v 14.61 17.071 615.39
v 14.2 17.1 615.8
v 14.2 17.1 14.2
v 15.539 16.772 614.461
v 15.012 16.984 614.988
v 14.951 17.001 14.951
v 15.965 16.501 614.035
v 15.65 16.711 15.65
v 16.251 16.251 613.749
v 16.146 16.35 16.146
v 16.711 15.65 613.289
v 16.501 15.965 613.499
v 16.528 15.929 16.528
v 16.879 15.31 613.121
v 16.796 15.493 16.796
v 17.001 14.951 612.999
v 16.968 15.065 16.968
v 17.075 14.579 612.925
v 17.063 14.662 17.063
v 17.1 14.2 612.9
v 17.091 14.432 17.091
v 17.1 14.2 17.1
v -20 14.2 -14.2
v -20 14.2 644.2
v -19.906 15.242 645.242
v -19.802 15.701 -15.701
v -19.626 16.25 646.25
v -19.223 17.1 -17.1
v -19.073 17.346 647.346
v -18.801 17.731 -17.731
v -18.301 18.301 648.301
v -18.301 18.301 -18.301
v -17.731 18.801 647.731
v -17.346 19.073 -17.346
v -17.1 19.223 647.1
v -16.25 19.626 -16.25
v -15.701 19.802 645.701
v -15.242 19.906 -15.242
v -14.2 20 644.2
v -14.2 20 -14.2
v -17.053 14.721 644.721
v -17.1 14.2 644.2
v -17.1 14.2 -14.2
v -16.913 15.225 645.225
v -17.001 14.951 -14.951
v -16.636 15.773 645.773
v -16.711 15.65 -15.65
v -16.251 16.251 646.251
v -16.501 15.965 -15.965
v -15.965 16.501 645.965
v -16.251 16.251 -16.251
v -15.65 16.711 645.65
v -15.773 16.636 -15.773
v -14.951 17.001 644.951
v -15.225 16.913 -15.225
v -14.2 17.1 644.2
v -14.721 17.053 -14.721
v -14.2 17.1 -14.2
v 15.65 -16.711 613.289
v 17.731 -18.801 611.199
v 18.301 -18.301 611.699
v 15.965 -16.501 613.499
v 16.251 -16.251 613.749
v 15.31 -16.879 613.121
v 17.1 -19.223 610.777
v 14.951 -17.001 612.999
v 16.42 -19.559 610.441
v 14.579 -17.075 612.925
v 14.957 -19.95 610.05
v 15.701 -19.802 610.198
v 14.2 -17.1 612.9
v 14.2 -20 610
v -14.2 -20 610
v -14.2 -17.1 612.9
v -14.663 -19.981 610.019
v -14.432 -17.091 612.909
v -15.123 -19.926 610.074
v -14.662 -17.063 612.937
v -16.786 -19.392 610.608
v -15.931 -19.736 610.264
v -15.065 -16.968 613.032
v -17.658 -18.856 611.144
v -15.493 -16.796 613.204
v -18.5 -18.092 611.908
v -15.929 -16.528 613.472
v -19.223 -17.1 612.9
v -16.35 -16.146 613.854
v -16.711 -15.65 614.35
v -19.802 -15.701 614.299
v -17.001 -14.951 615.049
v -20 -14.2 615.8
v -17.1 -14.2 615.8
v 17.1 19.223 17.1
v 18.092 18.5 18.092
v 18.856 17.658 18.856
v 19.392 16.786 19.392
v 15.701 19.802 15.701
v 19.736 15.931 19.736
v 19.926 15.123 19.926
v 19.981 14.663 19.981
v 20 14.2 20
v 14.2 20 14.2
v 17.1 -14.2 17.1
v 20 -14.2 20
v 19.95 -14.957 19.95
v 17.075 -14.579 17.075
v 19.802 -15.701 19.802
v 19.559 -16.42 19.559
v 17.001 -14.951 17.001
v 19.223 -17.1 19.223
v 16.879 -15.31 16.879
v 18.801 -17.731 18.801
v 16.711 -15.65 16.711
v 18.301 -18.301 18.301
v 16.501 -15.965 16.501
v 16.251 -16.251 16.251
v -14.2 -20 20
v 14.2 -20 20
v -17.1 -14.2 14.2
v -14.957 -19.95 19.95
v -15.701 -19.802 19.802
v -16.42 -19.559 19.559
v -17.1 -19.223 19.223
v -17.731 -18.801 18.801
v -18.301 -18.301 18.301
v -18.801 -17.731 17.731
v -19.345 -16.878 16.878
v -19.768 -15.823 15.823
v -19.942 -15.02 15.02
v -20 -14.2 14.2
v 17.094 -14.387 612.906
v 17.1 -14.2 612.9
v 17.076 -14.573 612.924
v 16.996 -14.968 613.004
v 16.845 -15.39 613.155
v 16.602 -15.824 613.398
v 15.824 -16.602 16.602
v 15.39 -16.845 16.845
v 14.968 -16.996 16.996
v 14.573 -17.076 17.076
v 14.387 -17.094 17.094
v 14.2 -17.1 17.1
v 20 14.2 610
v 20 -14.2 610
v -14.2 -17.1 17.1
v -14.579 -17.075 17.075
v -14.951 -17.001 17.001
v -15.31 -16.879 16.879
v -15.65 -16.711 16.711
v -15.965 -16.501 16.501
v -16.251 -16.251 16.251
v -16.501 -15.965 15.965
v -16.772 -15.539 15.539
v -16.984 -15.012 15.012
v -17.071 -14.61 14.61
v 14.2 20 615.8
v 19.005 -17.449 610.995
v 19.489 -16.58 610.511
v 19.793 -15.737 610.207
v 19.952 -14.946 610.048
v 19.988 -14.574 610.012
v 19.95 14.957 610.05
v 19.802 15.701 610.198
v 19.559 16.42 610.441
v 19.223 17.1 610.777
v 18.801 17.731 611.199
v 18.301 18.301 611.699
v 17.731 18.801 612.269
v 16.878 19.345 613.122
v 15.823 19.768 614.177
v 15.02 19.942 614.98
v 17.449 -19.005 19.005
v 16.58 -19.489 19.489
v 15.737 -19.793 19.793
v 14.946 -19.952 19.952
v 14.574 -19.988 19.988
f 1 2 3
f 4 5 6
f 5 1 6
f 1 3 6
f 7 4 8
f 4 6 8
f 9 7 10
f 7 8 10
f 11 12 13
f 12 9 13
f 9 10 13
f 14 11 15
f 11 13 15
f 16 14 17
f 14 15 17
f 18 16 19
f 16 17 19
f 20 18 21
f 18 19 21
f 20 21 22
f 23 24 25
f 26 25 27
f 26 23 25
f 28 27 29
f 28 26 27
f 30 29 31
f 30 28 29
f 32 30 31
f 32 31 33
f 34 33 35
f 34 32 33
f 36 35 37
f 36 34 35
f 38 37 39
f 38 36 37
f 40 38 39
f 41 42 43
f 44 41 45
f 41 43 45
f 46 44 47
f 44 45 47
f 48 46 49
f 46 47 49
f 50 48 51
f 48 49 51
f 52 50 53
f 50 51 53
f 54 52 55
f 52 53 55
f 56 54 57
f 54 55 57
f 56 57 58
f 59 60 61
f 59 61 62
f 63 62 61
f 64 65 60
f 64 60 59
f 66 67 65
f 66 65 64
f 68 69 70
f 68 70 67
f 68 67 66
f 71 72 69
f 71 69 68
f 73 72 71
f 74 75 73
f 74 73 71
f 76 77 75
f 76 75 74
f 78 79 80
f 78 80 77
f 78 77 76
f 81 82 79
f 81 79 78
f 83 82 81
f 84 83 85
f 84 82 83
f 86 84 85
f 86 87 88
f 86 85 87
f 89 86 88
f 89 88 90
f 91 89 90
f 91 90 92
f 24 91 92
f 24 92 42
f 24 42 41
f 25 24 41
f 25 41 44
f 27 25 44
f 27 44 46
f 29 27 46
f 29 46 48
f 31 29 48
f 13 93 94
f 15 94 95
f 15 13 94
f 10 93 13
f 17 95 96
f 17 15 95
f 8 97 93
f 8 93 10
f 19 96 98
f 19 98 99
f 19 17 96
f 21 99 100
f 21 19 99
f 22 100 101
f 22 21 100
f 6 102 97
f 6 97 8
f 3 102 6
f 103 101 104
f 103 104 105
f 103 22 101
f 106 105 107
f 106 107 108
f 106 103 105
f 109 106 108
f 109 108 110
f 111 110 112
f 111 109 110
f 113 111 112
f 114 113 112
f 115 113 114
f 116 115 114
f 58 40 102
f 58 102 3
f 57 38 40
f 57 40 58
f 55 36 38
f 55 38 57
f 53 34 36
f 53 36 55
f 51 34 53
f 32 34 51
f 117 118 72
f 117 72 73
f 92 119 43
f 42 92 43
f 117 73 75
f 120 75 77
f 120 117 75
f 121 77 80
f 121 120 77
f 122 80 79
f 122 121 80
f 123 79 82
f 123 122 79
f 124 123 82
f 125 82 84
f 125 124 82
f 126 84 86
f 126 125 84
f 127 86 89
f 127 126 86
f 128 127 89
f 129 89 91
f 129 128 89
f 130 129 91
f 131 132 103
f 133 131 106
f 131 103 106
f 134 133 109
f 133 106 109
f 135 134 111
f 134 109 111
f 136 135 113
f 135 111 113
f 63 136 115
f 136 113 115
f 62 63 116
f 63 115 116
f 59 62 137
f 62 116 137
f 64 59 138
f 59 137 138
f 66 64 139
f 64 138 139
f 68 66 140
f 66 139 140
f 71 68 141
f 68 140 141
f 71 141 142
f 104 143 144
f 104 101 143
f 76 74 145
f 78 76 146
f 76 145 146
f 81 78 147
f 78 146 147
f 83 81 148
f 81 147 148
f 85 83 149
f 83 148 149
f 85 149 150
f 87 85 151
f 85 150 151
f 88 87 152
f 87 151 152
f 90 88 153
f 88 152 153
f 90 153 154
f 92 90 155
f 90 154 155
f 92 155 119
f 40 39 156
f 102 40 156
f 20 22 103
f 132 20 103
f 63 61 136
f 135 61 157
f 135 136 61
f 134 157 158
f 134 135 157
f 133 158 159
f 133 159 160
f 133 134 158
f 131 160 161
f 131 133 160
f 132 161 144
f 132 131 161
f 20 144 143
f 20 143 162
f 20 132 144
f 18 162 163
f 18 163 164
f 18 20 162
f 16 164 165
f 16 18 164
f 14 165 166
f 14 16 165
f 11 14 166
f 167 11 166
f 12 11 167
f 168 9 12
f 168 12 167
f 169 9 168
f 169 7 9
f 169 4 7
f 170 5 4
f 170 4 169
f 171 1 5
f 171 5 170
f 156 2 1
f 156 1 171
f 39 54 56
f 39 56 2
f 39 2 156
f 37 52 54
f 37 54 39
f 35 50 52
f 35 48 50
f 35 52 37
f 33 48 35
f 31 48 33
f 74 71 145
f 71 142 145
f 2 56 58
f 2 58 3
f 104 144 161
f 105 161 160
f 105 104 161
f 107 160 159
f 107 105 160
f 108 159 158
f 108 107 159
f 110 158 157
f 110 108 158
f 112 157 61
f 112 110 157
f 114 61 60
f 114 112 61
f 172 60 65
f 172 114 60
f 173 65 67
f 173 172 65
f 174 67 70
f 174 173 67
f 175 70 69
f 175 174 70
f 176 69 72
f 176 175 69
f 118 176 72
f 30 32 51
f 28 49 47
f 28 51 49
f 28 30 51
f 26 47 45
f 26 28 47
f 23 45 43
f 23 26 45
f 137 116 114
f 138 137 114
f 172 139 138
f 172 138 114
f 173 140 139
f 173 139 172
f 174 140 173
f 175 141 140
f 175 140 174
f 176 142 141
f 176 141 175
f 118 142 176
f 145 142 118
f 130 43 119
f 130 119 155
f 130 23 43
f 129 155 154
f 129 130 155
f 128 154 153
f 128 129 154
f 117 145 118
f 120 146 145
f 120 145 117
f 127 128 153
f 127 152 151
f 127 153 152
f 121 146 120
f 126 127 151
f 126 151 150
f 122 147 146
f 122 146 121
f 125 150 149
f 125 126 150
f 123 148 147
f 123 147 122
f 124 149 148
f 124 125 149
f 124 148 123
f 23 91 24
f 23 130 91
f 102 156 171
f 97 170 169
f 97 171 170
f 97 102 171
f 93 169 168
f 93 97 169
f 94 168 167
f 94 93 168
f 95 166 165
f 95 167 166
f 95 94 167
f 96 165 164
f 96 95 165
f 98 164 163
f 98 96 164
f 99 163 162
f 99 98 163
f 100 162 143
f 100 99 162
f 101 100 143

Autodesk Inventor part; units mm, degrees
ref_plane "Plano inicial" through (0, 0, -18.3012) normal (0, 0, 1) x (1, 0, 0)
ref_plane "Plano final" through (0, 0, 648.3012) normal (0, 0, 1) x (1, 0, 0)
sketch "Boceto" plane through (0, 0, 0) normal (0, 0, 1) x (1, 0, 0)
  line L0 (-14.2, 20) -> (14.2, 20)
  line L1 (20, 14.2) -> (20, -14.2)
  line L2 (14.2, -20) -> (-14.2, -20)
  line L3 (-20, -14.2) -> (-20, 14.2)
  arc A0 (-14.2, 20) -> (-20, 14.2) centre (-14.2, 14.2) ccw
  arc A1 (20, 14.2) -> (14.2, 20) centre (14.2, 14.2) ccw
  arc A2 (14.2, -20) -> (20, -14.2) centre (14.2, -14.2) ccw
  arc A3 (-20, -14.2) -> (-14.2, -20) centre (-14.2, -14.2) ccw
  line L4 (-29.6817, 0) -> (29.6817, 0) construction
  line L5 (0, -29.6817) -> (0, 29.6817) construction
  arc A4 (-14.2, 17.1) -> (-17.1, 14.2) centre (-14.2, 14.2) ccw
  line L6 (-14.2, 17.1) -> (14.2, 17.1)
  arc A5 (17.1, 14.2) -> (14.2, 17.1) centre (14.2, 14.2) ccw
  line L7 (17.1, 14.2) -> (17.1, -14.2)
  arc A6 (14.2, -17.1) -> (17.1, -14.2) centre (14.2, -14.2) ccw
  line L8 (14.2, -17.1) -> (-14.2, -17.1)
  arc A7 (-17.1, -14.2) -> (-14.2, -17.1) centre (-14.2, -14.2) ccw
  line L9 (-17.1, -14.2) -> (-17.1, 14.2)
  point P0 (-20, 20)
  point P1 (20, -20)
  point P2 (20, 20)
  dimension "b" = 40
  dimension "msp_r" = 5.8
  dimension "d8" = 20
  dimension "d9" = 20
  dimension "d10" = 2.9
extrude "Cuerpo" add sketch "Boceto" along normal up to surface (666.6024 mm away) from surface at -18.3012
sketch "Sketch2" plane through (0, 0, 0) normal (0, 0, 1) x (1, 0, 0)
  line L0 (0, 0) -> (10, 0)
ref_plane "Work Plane3" through (0, 0, 0) normal (0, -1, 0) x (1, 0, 0)
sketch "Sketch3" plane through (0, 0, 0) normal (0, -1, 0) x (1, 0, 0)
  line L0 (-2, -18.3012) -> (12, -18.3012)
  line L1 (-2, 648.3012) -> (12, 648.3012)
  dimension "d14" = 666.6024
ref_plane "Plano de trabajo4" through (0, 20, -20) normal (0, -0.7071, -0.7071) x (1, 0, 0)
split "Dividir1" plane through (0, 20, -20) removes the side toward (0, -0.7071, -0.7071)
ref_plane "Plano de trabajo5" through (-20, 0, -20) normal (0.7071, 0, -0.7071) x (-0.7071, 0, -0.7071)
split "Dividir2" plane through (-20, 0, -20) removes the side toward (0.7071, 0, -0.7071)
ref_plane "Plano de trabajo6" through (-20, 0, 650) normal (0.7071, 0, 0.7071) x (0.7071, 0, -0.7071)
split "Dividir3" plane through (-20, 0, 650) removes the side toward (0.7071, 0, 0.7071)
ref_plane "Plano de trabajo7" through (0, 20, 650) normal (0, -0.7071, 0.7071) x (1, 0, 0)
split "Dividir4" plane through (0, 20, 650) removes the side toward (0, -0.7071, 0.7071)
equation "\"msp_r\" = 2 * ParT"
equation "\"d8\" = d9"
equation "\"d9\" = 0.5 * b"
equation "\"d10\" = ParT"
equation "\"G_OFFSET_START\" = 18.30122"
equation "\"G_OFFSET_END\" = 18.30122"
equation "\"d11\" = -G_OFFSET_START"
equation "\"d12\" = G_OFFSET_END + B_L"
equation "\"G_L\" = d14"
equation "\"ParT\" = 2.9"
equation "\"B_L\" = 630"
properties part number "DIN 59 410 - 40x40x2.9-666.602" material "Acero, suave"
